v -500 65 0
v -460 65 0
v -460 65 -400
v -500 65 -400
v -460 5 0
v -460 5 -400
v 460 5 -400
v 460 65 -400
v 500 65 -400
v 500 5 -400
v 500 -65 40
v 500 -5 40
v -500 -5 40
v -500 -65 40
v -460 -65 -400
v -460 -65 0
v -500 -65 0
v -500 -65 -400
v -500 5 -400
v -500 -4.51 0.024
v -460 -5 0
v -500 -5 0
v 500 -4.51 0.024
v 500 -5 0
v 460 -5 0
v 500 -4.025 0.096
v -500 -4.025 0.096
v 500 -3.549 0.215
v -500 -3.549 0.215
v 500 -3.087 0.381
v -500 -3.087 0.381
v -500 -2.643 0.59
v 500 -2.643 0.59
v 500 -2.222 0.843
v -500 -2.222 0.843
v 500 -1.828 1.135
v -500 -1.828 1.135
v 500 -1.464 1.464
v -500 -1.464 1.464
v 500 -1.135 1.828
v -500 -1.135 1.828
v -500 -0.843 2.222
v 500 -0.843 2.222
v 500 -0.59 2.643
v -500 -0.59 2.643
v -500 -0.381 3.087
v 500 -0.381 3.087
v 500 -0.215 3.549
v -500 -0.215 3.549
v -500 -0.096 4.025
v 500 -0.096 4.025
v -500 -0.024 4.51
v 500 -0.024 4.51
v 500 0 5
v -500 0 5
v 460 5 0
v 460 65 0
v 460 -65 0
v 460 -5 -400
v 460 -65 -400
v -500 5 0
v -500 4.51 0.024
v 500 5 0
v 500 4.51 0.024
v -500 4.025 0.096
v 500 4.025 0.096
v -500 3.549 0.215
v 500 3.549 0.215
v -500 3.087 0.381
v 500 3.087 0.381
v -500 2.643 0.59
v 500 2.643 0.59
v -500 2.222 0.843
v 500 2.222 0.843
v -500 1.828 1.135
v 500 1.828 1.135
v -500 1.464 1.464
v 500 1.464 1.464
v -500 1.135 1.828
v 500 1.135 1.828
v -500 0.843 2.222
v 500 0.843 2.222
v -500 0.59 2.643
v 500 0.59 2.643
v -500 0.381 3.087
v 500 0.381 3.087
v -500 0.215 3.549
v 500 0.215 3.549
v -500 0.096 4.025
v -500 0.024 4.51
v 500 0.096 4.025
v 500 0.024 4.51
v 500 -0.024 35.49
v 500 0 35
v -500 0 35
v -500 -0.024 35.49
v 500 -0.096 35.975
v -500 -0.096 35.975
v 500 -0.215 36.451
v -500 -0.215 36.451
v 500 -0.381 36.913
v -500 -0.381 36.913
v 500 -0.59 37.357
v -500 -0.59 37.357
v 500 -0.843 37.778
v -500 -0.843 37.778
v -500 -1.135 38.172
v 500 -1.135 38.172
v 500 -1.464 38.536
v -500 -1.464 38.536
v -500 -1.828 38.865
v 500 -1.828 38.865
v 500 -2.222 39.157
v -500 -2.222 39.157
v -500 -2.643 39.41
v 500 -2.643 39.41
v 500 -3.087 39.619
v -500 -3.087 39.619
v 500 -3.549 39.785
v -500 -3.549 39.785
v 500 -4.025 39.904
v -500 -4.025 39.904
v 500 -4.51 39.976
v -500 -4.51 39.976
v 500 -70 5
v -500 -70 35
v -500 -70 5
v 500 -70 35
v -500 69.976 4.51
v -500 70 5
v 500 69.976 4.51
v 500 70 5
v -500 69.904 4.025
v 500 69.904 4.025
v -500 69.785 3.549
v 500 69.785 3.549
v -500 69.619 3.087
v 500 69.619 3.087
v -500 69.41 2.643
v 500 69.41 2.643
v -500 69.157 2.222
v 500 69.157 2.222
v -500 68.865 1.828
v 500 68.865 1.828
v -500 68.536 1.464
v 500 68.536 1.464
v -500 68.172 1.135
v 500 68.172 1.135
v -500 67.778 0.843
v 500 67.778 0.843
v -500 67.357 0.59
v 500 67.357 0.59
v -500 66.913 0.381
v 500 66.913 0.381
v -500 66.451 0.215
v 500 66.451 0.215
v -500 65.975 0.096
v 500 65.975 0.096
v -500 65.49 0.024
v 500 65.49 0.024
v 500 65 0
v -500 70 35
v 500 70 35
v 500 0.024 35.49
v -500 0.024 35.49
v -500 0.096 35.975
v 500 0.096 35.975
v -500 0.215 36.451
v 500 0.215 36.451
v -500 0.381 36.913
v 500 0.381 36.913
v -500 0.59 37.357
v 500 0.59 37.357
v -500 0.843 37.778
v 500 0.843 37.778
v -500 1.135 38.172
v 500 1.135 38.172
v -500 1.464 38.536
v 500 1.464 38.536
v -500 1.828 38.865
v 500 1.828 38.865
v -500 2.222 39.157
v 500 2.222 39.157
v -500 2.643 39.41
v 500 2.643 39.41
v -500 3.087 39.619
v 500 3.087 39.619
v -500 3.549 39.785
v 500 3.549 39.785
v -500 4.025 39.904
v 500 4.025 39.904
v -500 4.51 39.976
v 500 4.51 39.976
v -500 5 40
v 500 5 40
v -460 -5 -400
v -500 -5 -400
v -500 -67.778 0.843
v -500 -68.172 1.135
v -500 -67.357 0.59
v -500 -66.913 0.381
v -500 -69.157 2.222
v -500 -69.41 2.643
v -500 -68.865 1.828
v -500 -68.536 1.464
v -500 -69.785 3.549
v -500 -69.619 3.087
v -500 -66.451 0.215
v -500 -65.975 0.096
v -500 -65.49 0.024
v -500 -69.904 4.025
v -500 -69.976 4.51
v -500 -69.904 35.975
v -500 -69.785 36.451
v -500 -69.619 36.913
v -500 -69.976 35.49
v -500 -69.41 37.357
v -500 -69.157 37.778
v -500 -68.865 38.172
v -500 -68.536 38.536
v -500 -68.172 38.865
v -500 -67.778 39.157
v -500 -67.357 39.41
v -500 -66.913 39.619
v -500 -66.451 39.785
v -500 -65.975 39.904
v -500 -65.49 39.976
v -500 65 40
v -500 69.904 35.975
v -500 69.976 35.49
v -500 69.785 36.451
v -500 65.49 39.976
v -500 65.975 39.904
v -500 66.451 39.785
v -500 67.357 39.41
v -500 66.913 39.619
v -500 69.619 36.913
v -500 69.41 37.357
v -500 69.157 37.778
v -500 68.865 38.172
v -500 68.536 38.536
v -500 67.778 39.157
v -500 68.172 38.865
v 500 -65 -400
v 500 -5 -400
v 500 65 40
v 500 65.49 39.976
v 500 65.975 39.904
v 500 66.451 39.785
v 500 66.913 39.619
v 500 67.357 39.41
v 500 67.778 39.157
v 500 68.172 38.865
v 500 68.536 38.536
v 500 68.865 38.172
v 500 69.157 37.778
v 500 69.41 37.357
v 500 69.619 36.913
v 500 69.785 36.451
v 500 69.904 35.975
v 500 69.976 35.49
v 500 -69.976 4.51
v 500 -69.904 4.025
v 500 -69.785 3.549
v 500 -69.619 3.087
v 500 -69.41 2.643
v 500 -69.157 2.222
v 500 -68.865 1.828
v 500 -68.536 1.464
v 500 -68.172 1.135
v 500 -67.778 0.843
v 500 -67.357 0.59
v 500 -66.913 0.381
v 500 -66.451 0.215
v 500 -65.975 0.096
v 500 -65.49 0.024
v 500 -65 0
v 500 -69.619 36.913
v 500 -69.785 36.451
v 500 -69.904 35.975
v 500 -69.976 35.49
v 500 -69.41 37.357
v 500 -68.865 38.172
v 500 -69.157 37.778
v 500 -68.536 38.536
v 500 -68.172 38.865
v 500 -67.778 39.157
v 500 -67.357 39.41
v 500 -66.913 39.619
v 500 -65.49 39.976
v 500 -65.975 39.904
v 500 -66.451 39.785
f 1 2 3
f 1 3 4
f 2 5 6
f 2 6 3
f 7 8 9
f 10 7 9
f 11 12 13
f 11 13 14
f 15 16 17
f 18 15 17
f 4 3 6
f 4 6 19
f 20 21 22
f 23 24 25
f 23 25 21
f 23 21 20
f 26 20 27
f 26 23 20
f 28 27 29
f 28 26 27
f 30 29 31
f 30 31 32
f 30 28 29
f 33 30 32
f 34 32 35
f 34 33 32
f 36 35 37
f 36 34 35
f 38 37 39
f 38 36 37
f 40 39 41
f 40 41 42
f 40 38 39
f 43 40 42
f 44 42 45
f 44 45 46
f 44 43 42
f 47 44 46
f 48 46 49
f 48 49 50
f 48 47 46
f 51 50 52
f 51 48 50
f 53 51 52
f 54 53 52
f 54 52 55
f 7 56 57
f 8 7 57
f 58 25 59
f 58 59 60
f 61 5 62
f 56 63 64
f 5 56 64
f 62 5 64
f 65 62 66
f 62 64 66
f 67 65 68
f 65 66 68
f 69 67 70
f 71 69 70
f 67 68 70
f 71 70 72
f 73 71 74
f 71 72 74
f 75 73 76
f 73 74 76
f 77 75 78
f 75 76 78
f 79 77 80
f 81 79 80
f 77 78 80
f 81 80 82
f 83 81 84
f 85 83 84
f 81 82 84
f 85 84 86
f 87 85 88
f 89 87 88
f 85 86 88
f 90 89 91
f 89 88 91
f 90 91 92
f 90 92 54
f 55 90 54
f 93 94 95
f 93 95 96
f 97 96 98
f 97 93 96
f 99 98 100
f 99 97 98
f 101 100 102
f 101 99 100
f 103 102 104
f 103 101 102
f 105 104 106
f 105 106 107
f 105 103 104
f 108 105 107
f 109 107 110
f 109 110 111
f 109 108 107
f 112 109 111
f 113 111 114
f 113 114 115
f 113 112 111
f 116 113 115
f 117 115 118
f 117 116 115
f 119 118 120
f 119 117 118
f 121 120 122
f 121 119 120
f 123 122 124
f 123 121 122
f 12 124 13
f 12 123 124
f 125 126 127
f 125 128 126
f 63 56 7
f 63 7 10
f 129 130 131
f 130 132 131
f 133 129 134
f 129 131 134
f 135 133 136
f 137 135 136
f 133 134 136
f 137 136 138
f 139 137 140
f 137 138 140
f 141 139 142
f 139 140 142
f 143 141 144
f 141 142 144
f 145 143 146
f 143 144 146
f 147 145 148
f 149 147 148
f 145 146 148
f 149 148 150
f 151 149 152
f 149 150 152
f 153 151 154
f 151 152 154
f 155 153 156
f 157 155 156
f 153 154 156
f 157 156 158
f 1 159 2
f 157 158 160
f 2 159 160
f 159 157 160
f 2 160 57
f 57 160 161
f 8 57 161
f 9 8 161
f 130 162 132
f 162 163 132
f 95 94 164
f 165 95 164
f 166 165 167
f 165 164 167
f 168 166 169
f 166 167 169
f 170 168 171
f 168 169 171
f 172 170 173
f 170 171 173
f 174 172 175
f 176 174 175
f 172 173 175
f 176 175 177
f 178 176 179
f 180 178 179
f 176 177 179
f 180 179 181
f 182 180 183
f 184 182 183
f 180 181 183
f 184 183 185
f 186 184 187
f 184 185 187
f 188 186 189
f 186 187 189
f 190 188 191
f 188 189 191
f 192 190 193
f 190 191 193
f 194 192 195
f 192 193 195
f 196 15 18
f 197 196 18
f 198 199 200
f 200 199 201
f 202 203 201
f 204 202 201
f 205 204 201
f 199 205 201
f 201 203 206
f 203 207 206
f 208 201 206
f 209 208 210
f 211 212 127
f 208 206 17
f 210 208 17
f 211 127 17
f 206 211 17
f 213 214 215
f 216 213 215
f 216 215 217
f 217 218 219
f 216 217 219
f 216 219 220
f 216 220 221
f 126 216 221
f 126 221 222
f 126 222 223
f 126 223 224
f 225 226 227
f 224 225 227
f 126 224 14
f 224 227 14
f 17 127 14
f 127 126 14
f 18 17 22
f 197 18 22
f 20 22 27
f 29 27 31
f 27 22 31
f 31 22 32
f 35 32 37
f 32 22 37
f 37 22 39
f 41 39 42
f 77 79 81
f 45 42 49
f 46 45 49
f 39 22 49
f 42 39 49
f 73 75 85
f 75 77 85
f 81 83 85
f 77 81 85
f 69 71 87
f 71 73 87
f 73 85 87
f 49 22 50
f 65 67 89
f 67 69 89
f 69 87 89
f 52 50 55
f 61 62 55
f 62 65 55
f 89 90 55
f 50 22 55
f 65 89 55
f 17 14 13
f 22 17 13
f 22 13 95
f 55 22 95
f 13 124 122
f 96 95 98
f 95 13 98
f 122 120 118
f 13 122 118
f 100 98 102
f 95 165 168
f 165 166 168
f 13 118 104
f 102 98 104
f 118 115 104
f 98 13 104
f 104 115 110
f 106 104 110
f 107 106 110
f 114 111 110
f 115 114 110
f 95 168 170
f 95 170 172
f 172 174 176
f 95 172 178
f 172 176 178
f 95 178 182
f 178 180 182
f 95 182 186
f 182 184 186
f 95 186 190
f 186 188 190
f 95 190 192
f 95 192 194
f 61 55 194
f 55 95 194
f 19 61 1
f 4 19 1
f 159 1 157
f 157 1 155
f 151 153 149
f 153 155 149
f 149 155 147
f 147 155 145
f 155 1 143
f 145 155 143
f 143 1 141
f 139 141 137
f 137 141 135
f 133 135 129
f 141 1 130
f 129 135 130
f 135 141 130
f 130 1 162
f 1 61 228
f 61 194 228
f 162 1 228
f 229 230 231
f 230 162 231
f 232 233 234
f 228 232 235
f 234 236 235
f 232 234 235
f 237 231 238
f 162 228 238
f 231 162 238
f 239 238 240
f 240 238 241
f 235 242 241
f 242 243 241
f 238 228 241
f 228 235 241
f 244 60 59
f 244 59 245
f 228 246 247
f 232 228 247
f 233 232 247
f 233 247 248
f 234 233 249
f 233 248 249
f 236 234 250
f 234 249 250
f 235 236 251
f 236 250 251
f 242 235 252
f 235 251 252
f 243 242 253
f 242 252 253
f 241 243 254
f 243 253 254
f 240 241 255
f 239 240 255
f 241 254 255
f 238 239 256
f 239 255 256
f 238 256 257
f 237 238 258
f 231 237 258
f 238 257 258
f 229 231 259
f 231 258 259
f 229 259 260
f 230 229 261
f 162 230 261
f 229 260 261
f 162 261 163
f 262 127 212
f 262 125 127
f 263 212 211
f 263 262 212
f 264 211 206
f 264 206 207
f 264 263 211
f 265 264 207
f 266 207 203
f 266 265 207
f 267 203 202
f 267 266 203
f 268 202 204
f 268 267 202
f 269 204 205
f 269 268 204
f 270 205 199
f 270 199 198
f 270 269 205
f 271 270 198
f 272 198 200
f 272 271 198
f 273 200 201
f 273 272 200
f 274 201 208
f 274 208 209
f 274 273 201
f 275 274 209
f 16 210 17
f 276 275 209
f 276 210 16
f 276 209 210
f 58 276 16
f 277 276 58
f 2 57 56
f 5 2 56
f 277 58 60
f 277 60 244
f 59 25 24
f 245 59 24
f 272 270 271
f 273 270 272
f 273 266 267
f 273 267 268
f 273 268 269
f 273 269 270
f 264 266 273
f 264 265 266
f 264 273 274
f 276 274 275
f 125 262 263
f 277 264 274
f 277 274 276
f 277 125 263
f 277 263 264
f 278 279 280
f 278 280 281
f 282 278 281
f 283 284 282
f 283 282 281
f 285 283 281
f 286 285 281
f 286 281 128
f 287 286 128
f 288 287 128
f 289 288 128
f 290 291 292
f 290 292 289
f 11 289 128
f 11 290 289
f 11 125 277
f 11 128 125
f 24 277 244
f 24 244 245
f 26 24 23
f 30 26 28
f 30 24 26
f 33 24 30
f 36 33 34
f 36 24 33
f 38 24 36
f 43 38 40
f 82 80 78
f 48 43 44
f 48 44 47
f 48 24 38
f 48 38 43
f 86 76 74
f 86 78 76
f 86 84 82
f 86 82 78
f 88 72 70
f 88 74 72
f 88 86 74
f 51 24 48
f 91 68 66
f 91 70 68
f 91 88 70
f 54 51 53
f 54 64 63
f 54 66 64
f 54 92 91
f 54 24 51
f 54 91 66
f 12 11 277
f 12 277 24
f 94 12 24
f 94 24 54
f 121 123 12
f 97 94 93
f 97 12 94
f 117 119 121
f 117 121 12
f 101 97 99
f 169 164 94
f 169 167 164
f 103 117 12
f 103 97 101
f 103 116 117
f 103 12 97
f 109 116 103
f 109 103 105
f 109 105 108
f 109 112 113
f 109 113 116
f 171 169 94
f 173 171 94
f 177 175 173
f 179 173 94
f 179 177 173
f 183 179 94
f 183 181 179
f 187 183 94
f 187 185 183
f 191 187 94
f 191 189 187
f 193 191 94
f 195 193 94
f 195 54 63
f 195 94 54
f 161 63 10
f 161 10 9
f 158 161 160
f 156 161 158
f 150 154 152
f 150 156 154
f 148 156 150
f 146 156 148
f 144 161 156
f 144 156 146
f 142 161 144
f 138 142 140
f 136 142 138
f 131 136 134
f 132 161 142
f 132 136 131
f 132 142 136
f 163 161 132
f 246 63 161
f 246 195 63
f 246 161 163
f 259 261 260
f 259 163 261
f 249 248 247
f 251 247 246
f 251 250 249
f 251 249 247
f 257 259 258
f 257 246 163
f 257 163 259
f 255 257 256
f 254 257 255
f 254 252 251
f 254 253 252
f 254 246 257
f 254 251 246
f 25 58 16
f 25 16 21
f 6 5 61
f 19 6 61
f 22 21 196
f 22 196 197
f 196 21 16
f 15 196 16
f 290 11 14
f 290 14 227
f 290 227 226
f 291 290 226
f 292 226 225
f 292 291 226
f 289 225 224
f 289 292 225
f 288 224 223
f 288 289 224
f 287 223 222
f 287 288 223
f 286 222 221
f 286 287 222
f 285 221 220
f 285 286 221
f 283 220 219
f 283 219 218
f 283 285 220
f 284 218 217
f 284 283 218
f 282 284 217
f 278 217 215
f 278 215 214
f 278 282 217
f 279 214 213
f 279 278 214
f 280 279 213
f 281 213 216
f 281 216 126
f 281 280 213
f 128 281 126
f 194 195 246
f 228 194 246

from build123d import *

# Parameters (mm, degrees)
F1_DEPTH = 500
F2_W     = 40
F2_H     = 60
F3_DEPTH = 400


# Not quite as in the source:
# - a pattern or mirror of a feature is missing from the dataset's text; its kind, count and spacing are read off the source's solid


with BuildPart() as f1:
    # F0 (on Right) → F1 (new body, symmetric)
    with BuildSketch(Plane.YZ):
        with BuildLine():
            Line((-65, 0), (-5, 0))
            ThreePointArc((-5, 0), (-1.4644660941, 1.4644660941), (0, 5))
            Line((0, 5), (0, 35))
            ThreePointArc((0, 35), (-1.4644660941, 38.5355339059), (-5, 40))
            Line((-5, 40), (-65, 40))
            ThreePointArc((-65, 40), (-68.5355339059, 38.5355339059), (-70, 35))
            Line((-70, 35), (-70, 5))
            ThreePointArc((-70, 5), (-68.5355339059, 1.4644660941), (-65, 0))
        make_face()
    extrude(amount=F1_DEPTH, both=True)

    # F2 (on face) → F3 (join)
    with BuildSketch(Plane(origin=(0, 0, 0), x_dir=(1, 0, 0), z_dir=(0, 0, -1))):
        with Locations((480, 35)):
            Rectangle(F2_W, F2_H)
    f3 = extrude(amount=F3_DEPTH)

    # F3_copies: F3 across plane
    add(f3.mirror(Plane(origin=(0, 0, 0), x_dir=(0, 0, -1), z_dir=(-1, 0, 0))))

    # F4: F1 across plane


with BuildPart() as f1_1:
    add(f1.part)
    add(f1.part.mirror(Plane.XZ))


solid = f1_1.part
